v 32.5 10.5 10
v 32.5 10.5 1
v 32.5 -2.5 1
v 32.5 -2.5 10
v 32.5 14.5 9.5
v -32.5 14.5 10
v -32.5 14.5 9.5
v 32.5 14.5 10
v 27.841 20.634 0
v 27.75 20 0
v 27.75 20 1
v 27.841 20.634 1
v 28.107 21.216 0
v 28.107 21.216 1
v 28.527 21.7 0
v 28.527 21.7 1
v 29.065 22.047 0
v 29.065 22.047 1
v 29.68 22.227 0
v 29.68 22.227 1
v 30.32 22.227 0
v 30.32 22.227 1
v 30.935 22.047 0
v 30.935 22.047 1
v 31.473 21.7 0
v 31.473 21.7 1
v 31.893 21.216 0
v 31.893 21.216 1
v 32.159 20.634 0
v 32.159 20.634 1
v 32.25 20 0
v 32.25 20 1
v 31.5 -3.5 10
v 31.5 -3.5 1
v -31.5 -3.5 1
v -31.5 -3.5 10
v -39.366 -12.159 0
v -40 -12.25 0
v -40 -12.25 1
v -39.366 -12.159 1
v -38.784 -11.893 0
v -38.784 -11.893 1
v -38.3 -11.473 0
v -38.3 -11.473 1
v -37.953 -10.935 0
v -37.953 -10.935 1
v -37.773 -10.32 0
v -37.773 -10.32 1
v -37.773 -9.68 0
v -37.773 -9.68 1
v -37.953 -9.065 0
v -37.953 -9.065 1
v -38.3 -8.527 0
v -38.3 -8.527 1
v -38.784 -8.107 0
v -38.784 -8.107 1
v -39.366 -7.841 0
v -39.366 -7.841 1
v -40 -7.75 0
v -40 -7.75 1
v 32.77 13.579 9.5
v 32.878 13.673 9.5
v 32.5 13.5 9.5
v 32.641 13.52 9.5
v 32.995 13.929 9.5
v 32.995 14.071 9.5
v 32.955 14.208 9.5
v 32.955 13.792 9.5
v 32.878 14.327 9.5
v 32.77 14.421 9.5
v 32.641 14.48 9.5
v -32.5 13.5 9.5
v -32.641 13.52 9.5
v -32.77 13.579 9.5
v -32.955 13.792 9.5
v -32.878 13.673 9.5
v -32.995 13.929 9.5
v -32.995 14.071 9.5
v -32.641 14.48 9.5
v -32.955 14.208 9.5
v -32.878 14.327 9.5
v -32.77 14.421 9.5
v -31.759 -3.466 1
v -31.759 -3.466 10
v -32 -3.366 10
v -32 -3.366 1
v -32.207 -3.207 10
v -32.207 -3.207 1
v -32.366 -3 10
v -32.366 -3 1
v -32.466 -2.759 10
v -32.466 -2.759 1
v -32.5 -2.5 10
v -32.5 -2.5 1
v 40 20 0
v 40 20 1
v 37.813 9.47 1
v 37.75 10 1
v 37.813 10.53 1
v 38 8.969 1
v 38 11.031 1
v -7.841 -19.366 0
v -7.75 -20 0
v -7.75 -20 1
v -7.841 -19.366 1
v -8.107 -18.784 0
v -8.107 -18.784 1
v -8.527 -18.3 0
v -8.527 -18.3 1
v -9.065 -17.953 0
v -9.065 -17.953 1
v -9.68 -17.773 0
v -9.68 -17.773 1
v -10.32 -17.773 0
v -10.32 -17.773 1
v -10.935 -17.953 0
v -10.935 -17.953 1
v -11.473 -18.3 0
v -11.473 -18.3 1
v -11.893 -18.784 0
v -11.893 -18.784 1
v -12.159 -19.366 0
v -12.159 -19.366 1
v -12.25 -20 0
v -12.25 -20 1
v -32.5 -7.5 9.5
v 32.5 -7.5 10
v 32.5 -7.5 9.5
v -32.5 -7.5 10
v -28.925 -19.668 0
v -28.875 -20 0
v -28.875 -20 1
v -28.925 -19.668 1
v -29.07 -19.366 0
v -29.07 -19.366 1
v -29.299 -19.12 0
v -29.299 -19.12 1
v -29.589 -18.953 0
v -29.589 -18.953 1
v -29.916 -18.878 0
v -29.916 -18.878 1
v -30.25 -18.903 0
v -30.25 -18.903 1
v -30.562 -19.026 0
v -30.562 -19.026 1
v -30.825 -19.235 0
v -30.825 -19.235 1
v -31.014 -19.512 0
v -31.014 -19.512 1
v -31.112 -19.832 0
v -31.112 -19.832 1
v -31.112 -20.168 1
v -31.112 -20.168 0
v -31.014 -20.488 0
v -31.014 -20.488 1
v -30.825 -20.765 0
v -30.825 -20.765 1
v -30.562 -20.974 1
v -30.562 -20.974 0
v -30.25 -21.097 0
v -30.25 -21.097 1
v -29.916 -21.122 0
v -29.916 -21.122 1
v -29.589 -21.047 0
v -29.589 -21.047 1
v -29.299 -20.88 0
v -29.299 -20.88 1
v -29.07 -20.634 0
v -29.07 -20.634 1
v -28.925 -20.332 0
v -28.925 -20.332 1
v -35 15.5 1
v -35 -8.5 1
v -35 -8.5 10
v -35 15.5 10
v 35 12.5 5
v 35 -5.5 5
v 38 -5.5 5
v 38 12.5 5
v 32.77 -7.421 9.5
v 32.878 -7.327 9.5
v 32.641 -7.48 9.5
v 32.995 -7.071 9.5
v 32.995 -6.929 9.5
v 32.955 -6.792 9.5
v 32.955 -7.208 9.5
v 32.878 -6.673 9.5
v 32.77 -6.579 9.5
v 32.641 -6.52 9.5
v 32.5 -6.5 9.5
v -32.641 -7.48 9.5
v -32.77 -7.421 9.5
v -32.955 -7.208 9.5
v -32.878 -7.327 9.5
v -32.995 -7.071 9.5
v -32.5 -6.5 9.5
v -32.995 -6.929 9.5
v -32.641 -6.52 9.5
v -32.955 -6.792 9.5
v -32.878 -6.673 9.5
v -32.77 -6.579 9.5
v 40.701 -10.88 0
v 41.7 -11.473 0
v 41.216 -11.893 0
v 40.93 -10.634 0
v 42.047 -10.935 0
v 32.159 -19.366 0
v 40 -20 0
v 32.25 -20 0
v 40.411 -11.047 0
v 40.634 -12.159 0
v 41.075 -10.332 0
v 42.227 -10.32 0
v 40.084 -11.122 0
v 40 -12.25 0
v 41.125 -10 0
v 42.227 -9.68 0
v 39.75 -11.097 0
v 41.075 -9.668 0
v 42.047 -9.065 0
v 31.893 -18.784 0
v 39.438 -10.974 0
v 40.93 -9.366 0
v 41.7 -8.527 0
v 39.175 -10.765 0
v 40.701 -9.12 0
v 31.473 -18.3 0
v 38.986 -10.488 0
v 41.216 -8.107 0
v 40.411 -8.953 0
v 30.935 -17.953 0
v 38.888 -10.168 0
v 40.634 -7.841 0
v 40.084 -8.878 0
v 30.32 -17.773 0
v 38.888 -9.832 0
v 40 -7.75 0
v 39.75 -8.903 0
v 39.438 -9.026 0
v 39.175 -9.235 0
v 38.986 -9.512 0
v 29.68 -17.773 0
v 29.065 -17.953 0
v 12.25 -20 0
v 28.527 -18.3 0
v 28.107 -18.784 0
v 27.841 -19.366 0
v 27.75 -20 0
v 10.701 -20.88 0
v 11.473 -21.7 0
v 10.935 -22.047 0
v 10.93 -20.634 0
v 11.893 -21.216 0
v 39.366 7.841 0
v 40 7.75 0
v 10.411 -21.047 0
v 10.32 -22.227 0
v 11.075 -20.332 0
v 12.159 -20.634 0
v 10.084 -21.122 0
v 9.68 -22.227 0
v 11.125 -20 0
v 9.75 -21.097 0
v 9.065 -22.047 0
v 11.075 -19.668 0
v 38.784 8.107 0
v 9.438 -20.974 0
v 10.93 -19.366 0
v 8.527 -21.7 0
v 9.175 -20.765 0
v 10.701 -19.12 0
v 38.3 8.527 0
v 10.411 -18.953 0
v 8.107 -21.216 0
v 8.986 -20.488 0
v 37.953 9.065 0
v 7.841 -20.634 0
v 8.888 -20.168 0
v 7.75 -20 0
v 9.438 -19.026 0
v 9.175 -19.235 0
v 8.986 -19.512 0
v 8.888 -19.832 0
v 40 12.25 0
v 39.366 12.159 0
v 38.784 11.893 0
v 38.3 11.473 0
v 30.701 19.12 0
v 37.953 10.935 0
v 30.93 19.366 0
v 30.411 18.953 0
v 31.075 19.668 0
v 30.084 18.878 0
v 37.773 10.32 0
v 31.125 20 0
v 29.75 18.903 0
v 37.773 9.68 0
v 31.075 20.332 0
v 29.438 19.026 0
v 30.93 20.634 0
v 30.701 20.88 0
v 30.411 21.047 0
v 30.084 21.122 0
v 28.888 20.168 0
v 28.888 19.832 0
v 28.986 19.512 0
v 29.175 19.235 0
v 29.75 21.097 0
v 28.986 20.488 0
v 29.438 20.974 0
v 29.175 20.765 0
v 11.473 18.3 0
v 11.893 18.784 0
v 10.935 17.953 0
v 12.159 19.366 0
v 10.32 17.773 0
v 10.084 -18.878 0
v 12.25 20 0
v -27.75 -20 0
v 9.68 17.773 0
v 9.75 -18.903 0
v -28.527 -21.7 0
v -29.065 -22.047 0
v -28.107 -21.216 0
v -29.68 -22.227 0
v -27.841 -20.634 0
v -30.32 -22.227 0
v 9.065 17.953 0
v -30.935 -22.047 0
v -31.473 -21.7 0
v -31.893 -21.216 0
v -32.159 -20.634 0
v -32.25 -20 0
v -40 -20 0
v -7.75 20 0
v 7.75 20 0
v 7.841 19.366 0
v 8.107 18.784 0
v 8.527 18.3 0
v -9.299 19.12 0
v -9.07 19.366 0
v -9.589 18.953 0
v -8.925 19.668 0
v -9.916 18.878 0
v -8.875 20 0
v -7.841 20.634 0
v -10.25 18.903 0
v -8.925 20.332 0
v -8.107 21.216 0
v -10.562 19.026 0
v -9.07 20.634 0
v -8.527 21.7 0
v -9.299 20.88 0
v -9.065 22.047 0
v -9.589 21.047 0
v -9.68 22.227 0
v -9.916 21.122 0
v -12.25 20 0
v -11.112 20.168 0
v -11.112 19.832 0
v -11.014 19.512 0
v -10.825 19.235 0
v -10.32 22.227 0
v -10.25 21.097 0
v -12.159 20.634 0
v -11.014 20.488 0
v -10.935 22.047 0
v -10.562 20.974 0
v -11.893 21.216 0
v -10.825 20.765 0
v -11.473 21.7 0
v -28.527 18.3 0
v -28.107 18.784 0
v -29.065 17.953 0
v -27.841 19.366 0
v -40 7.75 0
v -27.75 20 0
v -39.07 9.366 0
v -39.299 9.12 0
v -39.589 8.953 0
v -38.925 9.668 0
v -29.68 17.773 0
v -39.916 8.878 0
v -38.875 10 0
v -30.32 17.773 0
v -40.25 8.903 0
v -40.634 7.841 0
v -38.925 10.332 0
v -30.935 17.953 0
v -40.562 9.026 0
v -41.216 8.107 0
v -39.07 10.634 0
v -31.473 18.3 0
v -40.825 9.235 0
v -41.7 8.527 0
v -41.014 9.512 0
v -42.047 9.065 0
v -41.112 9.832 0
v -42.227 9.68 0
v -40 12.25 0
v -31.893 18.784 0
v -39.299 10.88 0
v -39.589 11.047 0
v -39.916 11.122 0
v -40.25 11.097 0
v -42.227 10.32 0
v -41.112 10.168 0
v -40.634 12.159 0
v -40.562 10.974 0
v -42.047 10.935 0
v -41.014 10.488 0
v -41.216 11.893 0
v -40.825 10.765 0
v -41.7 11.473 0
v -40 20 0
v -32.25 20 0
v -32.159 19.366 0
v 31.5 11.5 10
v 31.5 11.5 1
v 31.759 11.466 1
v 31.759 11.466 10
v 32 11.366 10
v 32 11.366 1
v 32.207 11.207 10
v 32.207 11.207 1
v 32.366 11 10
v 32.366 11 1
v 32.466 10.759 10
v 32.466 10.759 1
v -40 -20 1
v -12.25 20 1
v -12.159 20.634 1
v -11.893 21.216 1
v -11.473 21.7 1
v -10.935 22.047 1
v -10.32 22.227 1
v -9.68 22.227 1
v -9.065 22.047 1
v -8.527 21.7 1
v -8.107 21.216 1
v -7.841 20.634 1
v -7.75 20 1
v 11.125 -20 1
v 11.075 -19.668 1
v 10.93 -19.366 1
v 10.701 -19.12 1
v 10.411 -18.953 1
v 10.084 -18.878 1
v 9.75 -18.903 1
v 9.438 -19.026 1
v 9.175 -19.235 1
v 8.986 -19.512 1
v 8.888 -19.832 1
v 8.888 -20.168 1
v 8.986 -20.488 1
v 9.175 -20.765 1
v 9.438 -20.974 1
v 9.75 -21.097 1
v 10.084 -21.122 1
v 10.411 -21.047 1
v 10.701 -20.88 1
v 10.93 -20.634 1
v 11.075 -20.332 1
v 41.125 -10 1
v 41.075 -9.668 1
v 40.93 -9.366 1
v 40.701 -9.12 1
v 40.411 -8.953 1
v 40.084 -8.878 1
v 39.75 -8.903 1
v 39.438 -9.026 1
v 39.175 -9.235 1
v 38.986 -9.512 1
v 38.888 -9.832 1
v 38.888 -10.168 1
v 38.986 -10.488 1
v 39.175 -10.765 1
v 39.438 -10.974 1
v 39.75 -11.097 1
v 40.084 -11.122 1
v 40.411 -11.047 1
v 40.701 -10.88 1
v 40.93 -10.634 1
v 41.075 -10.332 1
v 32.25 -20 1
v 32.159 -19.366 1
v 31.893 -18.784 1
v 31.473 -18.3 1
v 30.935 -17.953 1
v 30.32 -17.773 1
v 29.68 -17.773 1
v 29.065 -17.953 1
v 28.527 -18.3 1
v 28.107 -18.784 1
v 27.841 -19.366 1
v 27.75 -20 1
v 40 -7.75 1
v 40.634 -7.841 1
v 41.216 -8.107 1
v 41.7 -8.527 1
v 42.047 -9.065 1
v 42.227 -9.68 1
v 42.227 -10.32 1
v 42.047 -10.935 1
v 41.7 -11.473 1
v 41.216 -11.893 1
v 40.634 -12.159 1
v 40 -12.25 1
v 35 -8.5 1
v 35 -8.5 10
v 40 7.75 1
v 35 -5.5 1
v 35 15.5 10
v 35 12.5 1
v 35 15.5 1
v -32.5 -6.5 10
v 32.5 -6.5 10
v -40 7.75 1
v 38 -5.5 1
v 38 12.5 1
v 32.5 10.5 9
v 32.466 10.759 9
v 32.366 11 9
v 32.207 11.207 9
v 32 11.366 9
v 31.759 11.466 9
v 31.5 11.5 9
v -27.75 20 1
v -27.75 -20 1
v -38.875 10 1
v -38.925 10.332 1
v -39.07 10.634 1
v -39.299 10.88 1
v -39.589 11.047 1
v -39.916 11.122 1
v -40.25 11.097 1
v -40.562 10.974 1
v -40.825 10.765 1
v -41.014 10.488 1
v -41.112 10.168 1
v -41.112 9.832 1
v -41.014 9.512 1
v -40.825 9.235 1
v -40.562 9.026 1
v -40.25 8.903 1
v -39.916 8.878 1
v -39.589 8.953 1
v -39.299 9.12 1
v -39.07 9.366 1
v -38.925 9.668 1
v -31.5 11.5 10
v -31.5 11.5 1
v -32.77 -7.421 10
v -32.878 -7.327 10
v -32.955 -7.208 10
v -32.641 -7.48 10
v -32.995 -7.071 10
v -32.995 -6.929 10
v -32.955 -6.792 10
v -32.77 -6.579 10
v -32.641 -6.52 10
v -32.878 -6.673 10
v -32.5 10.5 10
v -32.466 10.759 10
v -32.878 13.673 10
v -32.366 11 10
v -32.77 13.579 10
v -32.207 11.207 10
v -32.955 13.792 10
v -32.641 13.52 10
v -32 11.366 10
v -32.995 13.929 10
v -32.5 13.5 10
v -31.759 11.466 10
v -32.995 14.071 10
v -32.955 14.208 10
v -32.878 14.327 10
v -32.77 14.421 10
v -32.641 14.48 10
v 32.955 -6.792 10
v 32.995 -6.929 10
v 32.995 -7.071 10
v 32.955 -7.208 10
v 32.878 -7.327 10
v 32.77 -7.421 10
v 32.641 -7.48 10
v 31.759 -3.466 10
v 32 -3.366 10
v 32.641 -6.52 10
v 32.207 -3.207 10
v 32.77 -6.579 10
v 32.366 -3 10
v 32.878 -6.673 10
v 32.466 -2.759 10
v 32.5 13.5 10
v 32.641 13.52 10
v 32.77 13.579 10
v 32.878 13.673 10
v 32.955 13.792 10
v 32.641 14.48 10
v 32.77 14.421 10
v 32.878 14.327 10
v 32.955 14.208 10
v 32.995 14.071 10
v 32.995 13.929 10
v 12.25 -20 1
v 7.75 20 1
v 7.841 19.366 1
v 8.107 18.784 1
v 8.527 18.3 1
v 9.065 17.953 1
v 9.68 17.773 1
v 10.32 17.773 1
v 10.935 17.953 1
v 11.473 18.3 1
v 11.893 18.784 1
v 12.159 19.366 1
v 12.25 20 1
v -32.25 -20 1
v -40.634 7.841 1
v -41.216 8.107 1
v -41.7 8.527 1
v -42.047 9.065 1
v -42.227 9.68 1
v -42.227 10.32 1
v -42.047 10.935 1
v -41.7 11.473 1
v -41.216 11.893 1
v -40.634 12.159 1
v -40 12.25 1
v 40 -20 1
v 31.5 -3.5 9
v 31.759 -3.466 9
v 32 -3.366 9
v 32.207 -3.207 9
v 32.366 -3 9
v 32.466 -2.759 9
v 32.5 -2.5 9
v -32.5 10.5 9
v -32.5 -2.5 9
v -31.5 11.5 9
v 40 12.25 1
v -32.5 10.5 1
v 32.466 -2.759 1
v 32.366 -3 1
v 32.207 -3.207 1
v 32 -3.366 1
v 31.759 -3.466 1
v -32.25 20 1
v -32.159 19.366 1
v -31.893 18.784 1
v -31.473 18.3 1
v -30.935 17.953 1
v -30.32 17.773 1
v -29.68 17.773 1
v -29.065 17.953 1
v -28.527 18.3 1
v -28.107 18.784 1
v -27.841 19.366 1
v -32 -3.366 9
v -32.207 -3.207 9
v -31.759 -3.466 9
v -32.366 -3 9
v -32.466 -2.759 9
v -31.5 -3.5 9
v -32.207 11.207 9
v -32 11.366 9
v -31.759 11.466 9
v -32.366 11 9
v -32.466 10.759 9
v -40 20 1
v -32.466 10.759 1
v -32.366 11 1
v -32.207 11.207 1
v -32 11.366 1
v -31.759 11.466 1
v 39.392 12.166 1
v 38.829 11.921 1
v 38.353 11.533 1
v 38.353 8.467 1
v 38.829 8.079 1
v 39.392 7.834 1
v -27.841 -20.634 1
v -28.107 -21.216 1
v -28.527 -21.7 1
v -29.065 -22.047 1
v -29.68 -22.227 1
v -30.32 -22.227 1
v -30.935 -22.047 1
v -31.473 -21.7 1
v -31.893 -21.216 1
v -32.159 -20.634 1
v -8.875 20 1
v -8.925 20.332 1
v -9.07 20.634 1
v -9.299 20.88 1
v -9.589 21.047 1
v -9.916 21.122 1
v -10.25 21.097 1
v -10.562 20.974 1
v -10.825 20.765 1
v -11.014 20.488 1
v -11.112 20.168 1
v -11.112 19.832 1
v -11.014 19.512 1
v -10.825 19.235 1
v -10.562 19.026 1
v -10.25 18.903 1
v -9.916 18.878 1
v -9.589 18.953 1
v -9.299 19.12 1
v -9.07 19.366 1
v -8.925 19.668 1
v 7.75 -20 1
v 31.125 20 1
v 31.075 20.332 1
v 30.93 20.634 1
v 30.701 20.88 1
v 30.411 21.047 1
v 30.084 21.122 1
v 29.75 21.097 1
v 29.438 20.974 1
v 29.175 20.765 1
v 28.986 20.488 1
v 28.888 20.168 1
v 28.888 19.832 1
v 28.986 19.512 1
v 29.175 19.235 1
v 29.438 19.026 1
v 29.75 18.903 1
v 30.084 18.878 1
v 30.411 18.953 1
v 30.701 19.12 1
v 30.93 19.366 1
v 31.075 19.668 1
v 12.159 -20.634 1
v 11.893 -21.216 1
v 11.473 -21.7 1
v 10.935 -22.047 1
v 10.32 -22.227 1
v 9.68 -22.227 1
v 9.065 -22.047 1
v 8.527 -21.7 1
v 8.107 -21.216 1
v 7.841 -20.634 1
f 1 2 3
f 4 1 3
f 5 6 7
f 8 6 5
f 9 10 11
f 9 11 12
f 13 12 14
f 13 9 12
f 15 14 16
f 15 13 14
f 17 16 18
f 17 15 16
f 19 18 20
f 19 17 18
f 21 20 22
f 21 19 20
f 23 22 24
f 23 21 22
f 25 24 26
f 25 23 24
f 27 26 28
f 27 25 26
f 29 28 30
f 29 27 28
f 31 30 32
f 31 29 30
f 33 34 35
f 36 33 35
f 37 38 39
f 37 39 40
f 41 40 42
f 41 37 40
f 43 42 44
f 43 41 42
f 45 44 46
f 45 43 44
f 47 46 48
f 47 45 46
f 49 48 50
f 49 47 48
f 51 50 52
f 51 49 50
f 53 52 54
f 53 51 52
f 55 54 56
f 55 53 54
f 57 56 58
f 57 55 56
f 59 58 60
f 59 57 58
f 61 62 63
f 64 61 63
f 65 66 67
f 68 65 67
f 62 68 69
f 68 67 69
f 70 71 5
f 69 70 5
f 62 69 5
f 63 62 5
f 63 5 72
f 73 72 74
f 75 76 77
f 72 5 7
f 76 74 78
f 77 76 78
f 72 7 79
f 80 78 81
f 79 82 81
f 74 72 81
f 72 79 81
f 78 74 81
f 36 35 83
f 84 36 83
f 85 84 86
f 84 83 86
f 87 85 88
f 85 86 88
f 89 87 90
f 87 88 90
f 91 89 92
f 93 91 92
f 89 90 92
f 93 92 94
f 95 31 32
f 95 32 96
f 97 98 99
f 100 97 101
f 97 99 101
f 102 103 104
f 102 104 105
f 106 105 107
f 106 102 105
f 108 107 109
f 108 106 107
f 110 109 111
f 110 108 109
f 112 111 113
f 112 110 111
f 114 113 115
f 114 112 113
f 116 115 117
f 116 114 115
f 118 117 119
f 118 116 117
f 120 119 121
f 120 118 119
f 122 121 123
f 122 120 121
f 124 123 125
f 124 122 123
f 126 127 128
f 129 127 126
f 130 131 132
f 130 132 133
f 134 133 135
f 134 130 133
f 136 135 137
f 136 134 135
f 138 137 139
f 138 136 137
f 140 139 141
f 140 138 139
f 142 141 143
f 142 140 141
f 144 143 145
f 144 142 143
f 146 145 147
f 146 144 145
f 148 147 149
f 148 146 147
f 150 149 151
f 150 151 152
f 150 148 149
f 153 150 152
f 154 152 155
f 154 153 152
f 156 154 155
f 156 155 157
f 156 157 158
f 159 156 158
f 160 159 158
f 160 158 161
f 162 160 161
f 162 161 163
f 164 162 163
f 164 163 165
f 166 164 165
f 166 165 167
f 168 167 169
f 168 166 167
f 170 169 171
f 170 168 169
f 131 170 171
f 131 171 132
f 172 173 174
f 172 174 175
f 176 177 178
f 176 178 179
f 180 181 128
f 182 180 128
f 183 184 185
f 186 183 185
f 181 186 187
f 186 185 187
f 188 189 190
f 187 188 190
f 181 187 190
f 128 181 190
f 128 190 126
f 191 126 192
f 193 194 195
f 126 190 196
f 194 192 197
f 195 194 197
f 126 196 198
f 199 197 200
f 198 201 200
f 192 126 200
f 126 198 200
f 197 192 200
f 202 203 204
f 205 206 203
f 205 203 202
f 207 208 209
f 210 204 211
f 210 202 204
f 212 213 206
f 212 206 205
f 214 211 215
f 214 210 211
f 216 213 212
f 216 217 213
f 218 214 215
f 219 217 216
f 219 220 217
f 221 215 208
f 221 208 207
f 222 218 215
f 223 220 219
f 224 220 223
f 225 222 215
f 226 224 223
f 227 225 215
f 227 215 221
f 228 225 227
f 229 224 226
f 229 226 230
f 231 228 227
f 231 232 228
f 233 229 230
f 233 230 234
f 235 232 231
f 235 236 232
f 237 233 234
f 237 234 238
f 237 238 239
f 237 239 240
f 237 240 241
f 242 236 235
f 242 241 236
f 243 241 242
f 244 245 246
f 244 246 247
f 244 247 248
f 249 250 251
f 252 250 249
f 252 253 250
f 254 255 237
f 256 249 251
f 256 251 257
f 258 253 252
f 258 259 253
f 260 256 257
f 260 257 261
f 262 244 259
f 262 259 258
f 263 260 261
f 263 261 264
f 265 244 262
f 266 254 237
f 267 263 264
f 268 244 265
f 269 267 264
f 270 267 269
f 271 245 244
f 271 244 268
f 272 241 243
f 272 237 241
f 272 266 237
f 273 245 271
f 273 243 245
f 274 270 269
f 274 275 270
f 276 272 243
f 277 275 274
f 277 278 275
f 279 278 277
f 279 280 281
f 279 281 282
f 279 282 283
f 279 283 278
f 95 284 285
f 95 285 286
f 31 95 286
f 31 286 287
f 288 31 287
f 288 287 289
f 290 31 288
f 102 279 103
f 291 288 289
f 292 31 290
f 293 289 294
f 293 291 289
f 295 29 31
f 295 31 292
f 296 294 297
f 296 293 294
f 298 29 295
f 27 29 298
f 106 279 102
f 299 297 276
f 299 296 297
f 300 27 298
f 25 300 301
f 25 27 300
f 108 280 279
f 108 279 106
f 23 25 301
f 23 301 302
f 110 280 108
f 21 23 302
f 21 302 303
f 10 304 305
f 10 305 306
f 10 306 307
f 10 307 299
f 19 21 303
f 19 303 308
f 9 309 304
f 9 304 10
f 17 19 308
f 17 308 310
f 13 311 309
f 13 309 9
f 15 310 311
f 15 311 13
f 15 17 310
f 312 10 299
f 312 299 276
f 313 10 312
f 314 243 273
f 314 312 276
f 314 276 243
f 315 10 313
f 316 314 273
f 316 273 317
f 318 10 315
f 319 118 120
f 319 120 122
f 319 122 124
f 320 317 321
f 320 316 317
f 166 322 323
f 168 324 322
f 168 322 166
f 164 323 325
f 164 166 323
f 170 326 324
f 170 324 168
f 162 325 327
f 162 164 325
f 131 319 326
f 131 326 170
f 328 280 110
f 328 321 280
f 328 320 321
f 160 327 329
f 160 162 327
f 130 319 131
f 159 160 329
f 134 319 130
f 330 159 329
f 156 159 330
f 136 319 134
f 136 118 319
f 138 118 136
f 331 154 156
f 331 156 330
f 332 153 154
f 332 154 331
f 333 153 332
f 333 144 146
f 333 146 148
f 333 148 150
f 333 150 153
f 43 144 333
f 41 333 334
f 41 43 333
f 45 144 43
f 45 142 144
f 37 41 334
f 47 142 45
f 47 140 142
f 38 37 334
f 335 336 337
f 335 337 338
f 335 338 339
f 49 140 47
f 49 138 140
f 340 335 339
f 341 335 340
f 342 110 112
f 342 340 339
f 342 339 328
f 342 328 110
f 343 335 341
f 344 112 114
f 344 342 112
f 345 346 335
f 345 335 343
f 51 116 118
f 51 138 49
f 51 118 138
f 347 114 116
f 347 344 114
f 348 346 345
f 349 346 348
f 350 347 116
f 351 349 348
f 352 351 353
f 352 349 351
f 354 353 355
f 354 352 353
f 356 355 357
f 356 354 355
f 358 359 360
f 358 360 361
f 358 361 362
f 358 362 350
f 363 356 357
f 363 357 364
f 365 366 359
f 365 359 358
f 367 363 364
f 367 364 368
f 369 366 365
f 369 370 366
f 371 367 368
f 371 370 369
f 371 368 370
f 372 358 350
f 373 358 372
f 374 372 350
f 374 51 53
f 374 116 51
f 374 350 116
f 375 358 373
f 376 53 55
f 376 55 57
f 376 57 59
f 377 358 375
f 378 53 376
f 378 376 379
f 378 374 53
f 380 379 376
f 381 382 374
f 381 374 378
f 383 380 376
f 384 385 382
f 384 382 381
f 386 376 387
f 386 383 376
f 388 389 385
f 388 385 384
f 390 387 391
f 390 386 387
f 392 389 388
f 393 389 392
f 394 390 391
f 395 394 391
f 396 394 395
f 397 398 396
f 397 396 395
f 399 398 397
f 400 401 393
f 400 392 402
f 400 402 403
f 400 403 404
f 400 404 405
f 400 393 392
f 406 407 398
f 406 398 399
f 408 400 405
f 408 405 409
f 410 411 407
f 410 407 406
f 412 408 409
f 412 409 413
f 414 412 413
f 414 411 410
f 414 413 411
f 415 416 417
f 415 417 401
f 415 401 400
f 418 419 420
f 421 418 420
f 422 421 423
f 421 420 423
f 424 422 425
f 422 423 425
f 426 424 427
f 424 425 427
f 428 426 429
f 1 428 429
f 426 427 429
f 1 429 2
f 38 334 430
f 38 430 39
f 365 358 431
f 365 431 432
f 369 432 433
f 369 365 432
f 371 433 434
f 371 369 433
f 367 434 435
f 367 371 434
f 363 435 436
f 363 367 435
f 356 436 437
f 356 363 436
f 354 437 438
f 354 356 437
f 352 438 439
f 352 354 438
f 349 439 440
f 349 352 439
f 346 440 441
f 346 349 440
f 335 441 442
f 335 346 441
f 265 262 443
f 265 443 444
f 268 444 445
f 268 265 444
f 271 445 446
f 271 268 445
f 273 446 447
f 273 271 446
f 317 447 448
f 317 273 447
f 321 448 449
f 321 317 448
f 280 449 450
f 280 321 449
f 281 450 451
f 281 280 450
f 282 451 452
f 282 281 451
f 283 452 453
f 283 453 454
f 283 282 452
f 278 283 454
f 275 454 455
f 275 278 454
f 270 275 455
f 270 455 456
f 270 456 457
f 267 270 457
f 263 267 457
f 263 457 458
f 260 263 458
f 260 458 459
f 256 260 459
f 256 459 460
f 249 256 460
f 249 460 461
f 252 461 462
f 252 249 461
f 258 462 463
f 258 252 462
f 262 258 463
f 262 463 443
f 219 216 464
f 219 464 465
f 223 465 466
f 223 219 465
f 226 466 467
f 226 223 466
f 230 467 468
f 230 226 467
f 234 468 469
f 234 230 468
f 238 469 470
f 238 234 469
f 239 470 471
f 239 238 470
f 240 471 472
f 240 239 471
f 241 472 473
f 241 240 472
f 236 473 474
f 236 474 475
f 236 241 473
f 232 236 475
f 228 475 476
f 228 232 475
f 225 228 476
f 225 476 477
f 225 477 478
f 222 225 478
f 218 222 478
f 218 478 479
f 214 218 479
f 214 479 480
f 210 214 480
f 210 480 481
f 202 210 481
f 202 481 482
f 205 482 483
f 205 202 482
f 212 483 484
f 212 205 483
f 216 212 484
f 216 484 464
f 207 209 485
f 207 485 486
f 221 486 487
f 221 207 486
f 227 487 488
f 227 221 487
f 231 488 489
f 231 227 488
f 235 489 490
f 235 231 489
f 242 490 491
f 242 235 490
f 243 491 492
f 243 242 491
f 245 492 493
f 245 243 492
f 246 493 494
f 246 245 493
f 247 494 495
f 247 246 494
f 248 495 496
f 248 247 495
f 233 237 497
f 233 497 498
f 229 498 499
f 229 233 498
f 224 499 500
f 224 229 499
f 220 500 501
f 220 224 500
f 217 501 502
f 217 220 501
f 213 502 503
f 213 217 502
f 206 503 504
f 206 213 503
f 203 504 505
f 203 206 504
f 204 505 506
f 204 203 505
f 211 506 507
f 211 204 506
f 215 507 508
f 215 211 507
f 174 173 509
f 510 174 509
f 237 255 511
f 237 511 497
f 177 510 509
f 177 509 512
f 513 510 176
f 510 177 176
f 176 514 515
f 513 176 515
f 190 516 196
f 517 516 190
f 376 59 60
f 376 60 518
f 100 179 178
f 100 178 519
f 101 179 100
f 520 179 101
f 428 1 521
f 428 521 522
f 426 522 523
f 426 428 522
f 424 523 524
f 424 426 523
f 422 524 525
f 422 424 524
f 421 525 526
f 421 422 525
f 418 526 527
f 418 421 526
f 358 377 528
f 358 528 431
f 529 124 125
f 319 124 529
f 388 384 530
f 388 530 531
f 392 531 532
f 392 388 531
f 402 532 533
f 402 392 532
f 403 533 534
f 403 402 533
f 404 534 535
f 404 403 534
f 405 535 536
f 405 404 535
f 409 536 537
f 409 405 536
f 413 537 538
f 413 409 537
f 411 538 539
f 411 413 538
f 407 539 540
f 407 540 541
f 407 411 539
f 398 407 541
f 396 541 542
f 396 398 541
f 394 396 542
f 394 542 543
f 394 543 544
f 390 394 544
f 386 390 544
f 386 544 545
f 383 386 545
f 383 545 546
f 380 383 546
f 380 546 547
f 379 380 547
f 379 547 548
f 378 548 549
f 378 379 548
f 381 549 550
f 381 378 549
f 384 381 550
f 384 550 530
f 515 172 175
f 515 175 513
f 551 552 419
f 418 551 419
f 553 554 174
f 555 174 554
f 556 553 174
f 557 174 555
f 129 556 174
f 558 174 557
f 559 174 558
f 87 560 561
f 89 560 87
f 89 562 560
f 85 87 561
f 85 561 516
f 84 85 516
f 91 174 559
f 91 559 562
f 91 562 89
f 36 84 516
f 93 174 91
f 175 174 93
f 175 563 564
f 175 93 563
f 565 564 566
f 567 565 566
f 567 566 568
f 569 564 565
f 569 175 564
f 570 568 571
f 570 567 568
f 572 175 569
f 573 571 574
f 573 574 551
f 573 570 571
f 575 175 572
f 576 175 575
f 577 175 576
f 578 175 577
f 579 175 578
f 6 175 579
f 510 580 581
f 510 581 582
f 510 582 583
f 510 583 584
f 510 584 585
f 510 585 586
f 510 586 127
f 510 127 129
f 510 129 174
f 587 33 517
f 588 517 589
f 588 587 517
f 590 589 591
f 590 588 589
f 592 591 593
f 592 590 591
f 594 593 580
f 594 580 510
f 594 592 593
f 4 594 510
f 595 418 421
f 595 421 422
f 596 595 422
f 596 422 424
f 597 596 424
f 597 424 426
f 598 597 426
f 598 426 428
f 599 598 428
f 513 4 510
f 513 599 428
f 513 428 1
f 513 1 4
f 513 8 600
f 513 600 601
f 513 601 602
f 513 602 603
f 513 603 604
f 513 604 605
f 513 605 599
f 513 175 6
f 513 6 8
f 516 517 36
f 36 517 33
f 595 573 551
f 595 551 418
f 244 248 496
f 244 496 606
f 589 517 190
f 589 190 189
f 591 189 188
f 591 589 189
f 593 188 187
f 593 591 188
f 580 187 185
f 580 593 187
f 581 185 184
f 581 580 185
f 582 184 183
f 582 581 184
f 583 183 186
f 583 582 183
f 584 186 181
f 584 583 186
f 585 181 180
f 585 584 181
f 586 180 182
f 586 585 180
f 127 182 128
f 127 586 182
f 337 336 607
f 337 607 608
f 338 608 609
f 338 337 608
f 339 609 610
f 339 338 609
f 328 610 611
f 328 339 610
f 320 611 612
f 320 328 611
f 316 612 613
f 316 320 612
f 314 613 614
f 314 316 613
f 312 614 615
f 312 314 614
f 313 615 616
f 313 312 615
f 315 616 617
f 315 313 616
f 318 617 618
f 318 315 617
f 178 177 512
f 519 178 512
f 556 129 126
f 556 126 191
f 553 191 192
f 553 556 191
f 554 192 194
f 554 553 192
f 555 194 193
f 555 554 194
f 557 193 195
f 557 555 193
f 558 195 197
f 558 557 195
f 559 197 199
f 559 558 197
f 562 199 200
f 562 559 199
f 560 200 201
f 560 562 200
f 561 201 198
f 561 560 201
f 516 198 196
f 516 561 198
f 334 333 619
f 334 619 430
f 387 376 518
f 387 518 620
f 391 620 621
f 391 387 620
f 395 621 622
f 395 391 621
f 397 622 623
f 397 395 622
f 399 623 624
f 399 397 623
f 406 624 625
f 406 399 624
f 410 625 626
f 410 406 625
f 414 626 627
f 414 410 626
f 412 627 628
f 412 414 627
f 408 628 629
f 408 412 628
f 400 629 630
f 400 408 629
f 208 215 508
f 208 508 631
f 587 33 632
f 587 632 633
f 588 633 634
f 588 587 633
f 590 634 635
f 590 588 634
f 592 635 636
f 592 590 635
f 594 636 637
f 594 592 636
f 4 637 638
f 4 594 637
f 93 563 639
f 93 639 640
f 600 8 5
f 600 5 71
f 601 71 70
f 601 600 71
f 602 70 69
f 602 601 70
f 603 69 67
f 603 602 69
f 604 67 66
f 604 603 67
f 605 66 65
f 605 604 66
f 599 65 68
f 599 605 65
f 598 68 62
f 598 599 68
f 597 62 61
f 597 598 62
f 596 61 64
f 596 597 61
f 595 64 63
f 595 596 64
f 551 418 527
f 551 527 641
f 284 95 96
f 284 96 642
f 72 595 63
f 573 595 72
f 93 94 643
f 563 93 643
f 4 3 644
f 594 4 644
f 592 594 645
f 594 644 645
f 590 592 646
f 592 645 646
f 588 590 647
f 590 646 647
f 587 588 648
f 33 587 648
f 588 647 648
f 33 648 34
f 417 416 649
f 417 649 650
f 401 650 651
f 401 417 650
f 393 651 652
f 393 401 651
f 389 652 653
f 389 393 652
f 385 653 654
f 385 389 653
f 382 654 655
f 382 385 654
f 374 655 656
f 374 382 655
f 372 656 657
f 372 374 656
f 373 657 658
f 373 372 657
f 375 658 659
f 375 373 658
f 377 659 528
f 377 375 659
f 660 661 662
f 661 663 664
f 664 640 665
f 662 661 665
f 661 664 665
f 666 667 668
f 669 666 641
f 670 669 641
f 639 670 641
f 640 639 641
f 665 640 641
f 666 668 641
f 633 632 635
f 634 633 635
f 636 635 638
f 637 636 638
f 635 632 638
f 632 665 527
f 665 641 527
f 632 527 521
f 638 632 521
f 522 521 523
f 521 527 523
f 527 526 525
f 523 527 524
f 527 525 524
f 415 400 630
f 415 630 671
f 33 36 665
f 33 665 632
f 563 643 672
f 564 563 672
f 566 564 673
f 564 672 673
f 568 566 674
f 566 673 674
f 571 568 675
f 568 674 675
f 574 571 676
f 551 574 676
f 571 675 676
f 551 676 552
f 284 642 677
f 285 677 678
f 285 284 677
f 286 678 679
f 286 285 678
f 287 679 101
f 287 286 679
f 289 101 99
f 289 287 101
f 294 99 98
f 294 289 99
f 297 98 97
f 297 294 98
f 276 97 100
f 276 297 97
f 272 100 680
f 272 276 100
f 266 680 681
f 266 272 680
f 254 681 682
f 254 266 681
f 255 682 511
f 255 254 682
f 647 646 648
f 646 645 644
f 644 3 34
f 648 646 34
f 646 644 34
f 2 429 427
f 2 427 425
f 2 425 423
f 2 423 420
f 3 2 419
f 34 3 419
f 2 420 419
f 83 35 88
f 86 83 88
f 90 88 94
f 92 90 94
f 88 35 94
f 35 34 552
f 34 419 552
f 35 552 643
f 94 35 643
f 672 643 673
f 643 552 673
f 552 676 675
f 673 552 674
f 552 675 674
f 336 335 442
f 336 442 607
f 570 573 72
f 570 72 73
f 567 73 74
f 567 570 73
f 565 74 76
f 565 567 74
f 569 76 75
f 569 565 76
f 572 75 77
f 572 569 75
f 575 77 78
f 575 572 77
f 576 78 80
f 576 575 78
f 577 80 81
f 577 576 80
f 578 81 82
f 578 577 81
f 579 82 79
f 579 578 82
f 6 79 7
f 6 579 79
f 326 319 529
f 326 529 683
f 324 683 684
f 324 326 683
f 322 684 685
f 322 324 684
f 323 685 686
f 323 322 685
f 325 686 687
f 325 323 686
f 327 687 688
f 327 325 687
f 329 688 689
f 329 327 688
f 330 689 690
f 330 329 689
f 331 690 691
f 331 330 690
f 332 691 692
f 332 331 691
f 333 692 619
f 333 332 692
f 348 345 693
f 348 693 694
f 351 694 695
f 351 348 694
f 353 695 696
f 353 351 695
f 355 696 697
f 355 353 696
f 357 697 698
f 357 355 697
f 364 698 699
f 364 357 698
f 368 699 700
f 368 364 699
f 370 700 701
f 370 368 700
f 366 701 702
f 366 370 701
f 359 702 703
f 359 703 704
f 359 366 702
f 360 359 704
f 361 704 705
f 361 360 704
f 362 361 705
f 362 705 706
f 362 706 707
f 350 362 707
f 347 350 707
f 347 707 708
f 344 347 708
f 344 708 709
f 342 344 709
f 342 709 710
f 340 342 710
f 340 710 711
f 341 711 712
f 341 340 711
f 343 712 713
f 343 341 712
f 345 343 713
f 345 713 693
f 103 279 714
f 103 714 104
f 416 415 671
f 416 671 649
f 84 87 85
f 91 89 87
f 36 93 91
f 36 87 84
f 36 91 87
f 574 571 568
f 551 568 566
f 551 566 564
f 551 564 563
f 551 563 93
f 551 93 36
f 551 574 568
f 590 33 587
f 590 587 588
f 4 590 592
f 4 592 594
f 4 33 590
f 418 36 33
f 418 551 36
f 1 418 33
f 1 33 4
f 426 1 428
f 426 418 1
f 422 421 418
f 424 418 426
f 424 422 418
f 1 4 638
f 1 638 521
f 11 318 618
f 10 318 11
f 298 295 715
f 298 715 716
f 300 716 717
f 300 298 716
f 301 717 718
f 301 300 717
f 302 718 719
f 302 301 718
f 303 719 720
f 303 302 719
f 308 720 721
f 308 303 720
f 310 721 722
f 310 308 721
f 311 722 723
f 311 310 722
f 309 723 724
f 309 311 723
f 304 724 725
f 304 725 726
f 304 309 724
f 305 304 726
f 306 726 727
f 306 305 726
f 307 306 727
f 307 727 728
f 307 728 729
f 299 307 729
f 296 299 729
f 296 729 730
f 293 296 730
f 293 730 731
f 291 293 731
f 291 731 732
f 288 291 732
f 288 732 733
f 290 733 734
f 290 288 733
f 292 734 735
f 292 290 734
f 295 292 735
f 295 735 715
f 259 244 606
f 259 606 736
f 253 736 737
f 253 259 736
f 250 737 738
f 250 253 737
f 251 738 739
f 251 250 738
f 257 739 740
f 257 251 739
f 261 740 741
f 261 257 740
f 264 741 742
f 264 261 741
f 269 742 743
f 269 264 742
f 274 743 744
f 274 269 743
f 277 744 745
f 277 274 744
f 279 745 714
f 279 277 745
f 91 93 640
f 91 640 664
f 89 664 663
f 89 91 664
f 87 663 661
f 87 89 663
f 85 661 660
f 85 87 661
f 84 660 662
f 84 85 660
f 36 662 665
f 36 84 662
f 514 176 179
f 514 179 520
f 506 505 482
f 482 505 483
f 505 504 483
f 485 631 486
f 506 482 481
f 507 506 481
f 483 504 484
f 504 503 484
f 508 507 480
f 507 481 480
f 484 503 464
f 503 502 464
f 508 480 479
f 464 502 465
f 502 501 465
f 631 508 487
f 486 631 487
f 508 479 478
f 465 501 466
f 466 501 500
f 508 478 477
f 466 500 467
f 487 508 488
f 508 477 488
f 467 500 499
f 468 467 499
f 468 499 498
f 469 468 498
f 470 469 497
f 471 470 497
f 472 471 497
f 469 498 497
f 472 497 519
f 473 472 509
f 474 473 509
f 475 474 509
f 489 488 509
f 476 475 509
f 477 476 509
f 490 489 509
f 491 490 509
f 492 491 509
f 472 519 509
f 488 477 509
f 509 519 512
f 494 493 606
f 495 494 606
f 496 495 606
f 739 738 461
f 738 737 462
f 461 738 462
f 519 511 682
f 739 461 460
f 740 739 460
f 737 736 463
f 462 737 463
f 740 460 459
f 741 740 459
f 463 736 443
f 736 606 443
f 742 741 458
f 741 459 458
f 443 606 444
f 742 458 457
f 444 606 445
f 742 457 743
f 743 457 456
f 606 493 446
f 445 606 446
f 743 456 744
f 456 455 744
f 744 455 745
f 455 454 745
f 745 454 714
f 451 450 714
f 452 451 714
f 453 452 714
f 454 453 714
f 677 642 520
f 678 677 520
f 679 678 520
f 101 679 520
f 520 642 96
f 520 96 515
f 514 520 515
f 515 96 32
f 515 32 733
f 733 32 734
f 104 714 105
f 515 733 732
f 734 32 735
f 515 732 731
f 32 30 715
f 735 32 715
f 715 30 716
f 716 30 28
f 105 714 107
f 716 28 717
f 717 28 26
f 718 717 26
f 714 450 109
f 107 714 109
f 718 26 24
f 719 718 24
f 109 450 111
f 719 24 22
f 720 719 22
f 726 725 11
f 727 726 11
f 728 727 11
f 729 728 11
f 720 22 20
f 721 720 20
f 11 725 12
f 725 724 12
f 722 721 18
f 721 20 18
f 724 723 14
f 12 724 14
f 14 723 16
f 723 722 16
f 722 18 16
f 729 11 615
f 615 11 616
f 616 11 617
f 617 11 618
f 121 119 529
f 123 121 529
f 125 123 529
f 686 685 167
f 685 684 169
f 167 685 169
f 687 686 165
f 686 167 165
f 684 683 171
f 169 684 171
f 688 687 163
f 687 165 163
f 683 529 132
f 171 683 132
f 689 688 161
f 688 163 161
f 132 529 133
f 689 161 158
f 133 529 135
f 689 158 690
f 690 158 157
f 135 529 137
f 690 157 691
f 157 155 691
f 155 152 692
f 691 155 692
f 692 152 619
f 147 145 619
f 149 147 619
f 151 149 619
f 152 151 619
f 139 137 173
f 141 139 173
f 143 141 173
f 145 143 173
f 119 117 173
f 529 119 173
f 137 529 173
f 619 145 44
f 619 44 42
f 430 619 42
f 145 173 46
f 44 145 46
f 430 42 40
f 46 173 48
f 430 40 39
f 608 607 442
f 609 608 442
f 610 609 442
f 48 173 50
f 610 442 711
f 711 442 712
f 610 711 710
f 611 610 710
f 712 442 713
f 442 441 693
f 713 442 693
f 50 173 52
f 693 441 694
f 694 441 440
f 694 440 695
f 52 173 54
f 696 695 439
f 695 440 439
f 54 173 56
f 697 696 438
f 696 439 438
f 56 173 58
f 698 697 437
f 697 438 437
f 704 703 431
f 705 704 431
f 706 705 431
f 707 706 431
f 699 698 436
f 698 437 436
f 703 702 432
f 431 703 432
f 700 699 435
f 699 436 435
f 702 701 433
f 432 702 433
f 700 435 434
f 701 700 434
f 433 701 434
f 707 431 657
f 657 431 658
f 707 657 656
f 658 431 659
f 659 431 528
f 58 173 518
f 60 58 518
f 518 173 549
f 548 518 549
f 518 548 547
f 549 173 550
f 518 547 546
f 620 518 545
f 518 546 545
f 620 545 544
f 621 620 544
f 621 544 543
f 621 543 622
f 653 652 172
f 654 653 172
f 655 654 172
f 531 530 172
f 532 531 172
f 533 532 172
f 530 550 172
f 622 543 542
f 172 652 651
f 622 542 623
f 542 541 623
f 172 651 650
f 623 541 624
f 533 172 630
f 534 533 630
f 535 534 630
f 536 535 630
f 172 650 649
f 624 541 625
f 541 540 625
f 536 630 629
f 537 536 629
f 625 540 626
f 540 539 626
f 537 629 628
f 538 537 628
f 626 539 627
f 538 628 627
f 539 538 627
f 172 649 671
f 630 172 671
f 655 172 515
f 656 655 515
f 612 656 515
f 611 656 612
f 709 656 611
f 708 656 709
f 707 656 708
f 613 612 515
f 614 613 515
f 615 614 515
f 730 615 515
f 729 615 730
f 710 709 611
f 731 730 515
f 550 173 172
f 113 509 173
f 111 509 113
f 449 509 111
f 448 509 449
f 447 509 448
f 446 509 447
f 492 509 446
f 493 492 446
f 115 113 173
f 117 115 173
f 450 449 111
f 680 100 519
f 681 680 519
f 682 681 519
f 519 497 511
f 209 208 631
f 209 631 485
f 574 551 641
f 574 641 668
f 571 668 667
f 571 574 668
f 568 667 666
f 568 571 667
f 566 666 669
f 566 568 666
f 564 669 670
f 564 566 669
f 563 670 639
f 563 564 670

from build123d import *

# Parameters (mm, degrees)
ESQUISSE1_R             = 1.125
BOSS_EXTRU_1_DEPTH      = 1
ESQUISSE2_W             = 70
ESQUISSE2_H             = 24
BOSS_EXTRU_2_DEPTH      = 9
ENL_V_MAT_EXTRU_1_DEPTH = 0.5
BOSS_EXTRU_4_DEPTH      = 1
ESQUISSE5_W             = 4
ESQUISSE5_H             = 18
BOSS_EXTRU_5_DEPTH      = 3


with BuildPart() as part:
    # Esquisse1 → Boss.-Extru.1 (new body)
    with BuildSketch(Plane.XY):
        with BuildLine():
            Line((-40, 20), (-32.25, 20))
            ThreePointArc((-32.25, 20), (-30, 17.75), (-27.75, 20))
            Line((-27.75, 20), (-12.25, 20))
            ThreePointArc((-12.25, 20), (-10, 22.25), (-7.75, 20))
            Line((-7.75, 20), (7.75, 20))
            ThreePointArc((7.75, 20), (10, 17.75), (12.25, 20))
            Line((12.25, 20), (27.75, 20))
            ThreePointArc((27.75, 20), (30, 22.25), (32.25, 20))
            Line((32.25, 20), (40, 20))
            Line((40, 20), (40, 12.25))
            ThreePointArc((40, 12.25), (37.75, 10), (40, 7.75))
            Line((40, 7.75), (40, -7.75))
            ThreePointArc((40, -7.75), (42.25, -10), (40, -12.25))
            Line((40, -12.25), (40, -20))
            Line((40, -20), (32.25, -20))
            ThreePointArc((32.25, -20), (30, -17.75), (27.75, -20))
            Line((27.75, -20), (12.25, -20))
            ThreePointArc((12.25, -20), (10, -22.25), (7.75, -20))
            Line((7.75, -20), (-7.75, -20))
            ThreePointArc((-7.75, -20), (-10, -17.75), (-12.25, -20))
            Line((-12.25, -20), (-27.75, -20))
            ThreePointArc((-27.75, -20), (-30, -22.25), (-32.25, -20))
            Line((-32.25, -20), (-40, -20))
            Line((-40, -20), (-40, -12.25))
            ThreePointArc((-40, -12.25), (-37.75, -10), (-40, -7.75))
            Line((-40, -7.75), (-40, 7.75))
            ThreePointArc((-40, 7.75), (-42.25, 10), (-40, 12.25))
            Line((-40, 12.25), (-40, 20))
        make_face()
        with Locations((-10, 20)):
            Circle(ESQUISSE1_R, mode=Mode.SUBTRACT)
        with Locations((30, 20)):
            Circle(ESQUISSE1_R, mode=Mode.SUBTRACT)
        with Locations((-40, 10)):
            Circle(ESQUISSE1_R, mode=Mode.SUBTRACT)
        with Locations((40, -10)):
            Circle(ESQUISSE1_R, mode=Mode.SUBTRACT)
        with Locations((10, -20)):
            Circle(ESQUISSE1_R, mode=Mode.SUBTRACT)
        with Locations((-30, -20)):
            Circle(ESQUISSE1_R, mode=Mode.SUBTRACT)
    extrude(amount=BOSS_EXTRU_1_DEPTH)

    # Esquisse2 → Boss.-Extru.2 (add)
    with BuildSketch(Plane.XY.offset(1)):
        with Locations((0, 3.5)):
            Rectangle(ESQUISSE2_W, ESQUISSE2_H)
        with BuildLine():
            Line((-31.5, 11.5), (31.5, 11.5))
            ThreePointArc((31.5, 11.5), (32.207106781, 11.207106781), (32.5, 10.5))
            Line((32.5, 10.5), (32.5, -2.5))
            ThreePointArc((32.5, -2.5), (32.207106781, -3.207106781), (31.5, -3.5))
            Line((31.5, -3.5), (-31.5, -3.5))
            ThreePointArc((-31.5, -3.5), (-32.207106781, -3.207106781), (-32.5, -2.5))
            Line((-32.5, -2.5), (-32.5, 10.5))
            ThreePointArc((-32.5, 10.5), (-32.207106781, 11.207106781), (-31.5, 11.5))
        make_face(mode=Mode.SUBTRACT)
    extrude(amount=BOSS_EXTRU_2_DEPTH)

    # Esquisse3 → Enlèv. mat.-Extru.1 (cut)
    with BuildSketch(Plane.XY.offset(10)):
        with BuildLine():
            Line((-32.5, 14.5), (32.5, 14.5))
            ThreePointArc((32.5, 14.5), (33, 14), (32.5, 13.5))
            Line((32.5, 13.5), (-32.5, 13.5))
            ThreePointArc((-32.5, 13.5), (-33, 14), (-32.5, 14.5))
        make_face()
        with BuildLine():
            Line((-32.5, -6.5), (32.5, -6.5))
            ThreePointArc((32.5, -6.5), (33, -7), (32.5, -7.5))
            Line((32.5, -7.5), (-32.5, -7.5))
            ThreePointArc((-32.5, -7.5), (-33, -7), (-32.5, -6.5))
        make_face()
    extrude(amount=-ENL_V_MAT_EXTRU_1_DEPTH, mode=Mode.SUBTRACT)

    # Esquisse5 → Boss.-Extru.5 (add)
    with BuildSketch(Plane(origin=(35, 0, 0), x_dir=(0, 0, -1), z_dir=(1, 0, 0))):
        with Locations((-3, 3.5)):
            Rectangle(ESQUISSE5_W, ESQUISSE5_H)
    extrude(amount=BOSS_EXTRU_5_DEPTH)


with BuildPart() as body_2:
    # Esquisse4 → Boss.-Extru.4 (new body)
    with BuildSketch(Plane.XY.offset(10)):
        with BuildLine():
            Line((32.5, -2.5), (32.5, 10.5))
            ThreePointArc((32.5, 10.5), (32.207106781, 11.207106781), (31.5, 11.5))
            Line((31.5, 11.5), (-31.5, 11.5))
            ThreePointArc((-31.5, 11.5), (-32.207106781, 11.207106781), (-32.5, 10.5))
            Line((-32.5, 10.5), (-32.5, -2.5))
            ThreePointArc((-32.5, -2.5), (-32.207106781, -3.207106781), (-31.5, -3.5))
            Line((-31.5, -3.5), (31.5, -3.5))
            ThreePointArc((31.5, -3.5), (32.207106781, -3.207106781), (32.5, -2.5))
        make_face()
    extrude(amount=-BOSS_EXTRU_4_DEPTH)


solid = Compound([part.part, body_2.part])
